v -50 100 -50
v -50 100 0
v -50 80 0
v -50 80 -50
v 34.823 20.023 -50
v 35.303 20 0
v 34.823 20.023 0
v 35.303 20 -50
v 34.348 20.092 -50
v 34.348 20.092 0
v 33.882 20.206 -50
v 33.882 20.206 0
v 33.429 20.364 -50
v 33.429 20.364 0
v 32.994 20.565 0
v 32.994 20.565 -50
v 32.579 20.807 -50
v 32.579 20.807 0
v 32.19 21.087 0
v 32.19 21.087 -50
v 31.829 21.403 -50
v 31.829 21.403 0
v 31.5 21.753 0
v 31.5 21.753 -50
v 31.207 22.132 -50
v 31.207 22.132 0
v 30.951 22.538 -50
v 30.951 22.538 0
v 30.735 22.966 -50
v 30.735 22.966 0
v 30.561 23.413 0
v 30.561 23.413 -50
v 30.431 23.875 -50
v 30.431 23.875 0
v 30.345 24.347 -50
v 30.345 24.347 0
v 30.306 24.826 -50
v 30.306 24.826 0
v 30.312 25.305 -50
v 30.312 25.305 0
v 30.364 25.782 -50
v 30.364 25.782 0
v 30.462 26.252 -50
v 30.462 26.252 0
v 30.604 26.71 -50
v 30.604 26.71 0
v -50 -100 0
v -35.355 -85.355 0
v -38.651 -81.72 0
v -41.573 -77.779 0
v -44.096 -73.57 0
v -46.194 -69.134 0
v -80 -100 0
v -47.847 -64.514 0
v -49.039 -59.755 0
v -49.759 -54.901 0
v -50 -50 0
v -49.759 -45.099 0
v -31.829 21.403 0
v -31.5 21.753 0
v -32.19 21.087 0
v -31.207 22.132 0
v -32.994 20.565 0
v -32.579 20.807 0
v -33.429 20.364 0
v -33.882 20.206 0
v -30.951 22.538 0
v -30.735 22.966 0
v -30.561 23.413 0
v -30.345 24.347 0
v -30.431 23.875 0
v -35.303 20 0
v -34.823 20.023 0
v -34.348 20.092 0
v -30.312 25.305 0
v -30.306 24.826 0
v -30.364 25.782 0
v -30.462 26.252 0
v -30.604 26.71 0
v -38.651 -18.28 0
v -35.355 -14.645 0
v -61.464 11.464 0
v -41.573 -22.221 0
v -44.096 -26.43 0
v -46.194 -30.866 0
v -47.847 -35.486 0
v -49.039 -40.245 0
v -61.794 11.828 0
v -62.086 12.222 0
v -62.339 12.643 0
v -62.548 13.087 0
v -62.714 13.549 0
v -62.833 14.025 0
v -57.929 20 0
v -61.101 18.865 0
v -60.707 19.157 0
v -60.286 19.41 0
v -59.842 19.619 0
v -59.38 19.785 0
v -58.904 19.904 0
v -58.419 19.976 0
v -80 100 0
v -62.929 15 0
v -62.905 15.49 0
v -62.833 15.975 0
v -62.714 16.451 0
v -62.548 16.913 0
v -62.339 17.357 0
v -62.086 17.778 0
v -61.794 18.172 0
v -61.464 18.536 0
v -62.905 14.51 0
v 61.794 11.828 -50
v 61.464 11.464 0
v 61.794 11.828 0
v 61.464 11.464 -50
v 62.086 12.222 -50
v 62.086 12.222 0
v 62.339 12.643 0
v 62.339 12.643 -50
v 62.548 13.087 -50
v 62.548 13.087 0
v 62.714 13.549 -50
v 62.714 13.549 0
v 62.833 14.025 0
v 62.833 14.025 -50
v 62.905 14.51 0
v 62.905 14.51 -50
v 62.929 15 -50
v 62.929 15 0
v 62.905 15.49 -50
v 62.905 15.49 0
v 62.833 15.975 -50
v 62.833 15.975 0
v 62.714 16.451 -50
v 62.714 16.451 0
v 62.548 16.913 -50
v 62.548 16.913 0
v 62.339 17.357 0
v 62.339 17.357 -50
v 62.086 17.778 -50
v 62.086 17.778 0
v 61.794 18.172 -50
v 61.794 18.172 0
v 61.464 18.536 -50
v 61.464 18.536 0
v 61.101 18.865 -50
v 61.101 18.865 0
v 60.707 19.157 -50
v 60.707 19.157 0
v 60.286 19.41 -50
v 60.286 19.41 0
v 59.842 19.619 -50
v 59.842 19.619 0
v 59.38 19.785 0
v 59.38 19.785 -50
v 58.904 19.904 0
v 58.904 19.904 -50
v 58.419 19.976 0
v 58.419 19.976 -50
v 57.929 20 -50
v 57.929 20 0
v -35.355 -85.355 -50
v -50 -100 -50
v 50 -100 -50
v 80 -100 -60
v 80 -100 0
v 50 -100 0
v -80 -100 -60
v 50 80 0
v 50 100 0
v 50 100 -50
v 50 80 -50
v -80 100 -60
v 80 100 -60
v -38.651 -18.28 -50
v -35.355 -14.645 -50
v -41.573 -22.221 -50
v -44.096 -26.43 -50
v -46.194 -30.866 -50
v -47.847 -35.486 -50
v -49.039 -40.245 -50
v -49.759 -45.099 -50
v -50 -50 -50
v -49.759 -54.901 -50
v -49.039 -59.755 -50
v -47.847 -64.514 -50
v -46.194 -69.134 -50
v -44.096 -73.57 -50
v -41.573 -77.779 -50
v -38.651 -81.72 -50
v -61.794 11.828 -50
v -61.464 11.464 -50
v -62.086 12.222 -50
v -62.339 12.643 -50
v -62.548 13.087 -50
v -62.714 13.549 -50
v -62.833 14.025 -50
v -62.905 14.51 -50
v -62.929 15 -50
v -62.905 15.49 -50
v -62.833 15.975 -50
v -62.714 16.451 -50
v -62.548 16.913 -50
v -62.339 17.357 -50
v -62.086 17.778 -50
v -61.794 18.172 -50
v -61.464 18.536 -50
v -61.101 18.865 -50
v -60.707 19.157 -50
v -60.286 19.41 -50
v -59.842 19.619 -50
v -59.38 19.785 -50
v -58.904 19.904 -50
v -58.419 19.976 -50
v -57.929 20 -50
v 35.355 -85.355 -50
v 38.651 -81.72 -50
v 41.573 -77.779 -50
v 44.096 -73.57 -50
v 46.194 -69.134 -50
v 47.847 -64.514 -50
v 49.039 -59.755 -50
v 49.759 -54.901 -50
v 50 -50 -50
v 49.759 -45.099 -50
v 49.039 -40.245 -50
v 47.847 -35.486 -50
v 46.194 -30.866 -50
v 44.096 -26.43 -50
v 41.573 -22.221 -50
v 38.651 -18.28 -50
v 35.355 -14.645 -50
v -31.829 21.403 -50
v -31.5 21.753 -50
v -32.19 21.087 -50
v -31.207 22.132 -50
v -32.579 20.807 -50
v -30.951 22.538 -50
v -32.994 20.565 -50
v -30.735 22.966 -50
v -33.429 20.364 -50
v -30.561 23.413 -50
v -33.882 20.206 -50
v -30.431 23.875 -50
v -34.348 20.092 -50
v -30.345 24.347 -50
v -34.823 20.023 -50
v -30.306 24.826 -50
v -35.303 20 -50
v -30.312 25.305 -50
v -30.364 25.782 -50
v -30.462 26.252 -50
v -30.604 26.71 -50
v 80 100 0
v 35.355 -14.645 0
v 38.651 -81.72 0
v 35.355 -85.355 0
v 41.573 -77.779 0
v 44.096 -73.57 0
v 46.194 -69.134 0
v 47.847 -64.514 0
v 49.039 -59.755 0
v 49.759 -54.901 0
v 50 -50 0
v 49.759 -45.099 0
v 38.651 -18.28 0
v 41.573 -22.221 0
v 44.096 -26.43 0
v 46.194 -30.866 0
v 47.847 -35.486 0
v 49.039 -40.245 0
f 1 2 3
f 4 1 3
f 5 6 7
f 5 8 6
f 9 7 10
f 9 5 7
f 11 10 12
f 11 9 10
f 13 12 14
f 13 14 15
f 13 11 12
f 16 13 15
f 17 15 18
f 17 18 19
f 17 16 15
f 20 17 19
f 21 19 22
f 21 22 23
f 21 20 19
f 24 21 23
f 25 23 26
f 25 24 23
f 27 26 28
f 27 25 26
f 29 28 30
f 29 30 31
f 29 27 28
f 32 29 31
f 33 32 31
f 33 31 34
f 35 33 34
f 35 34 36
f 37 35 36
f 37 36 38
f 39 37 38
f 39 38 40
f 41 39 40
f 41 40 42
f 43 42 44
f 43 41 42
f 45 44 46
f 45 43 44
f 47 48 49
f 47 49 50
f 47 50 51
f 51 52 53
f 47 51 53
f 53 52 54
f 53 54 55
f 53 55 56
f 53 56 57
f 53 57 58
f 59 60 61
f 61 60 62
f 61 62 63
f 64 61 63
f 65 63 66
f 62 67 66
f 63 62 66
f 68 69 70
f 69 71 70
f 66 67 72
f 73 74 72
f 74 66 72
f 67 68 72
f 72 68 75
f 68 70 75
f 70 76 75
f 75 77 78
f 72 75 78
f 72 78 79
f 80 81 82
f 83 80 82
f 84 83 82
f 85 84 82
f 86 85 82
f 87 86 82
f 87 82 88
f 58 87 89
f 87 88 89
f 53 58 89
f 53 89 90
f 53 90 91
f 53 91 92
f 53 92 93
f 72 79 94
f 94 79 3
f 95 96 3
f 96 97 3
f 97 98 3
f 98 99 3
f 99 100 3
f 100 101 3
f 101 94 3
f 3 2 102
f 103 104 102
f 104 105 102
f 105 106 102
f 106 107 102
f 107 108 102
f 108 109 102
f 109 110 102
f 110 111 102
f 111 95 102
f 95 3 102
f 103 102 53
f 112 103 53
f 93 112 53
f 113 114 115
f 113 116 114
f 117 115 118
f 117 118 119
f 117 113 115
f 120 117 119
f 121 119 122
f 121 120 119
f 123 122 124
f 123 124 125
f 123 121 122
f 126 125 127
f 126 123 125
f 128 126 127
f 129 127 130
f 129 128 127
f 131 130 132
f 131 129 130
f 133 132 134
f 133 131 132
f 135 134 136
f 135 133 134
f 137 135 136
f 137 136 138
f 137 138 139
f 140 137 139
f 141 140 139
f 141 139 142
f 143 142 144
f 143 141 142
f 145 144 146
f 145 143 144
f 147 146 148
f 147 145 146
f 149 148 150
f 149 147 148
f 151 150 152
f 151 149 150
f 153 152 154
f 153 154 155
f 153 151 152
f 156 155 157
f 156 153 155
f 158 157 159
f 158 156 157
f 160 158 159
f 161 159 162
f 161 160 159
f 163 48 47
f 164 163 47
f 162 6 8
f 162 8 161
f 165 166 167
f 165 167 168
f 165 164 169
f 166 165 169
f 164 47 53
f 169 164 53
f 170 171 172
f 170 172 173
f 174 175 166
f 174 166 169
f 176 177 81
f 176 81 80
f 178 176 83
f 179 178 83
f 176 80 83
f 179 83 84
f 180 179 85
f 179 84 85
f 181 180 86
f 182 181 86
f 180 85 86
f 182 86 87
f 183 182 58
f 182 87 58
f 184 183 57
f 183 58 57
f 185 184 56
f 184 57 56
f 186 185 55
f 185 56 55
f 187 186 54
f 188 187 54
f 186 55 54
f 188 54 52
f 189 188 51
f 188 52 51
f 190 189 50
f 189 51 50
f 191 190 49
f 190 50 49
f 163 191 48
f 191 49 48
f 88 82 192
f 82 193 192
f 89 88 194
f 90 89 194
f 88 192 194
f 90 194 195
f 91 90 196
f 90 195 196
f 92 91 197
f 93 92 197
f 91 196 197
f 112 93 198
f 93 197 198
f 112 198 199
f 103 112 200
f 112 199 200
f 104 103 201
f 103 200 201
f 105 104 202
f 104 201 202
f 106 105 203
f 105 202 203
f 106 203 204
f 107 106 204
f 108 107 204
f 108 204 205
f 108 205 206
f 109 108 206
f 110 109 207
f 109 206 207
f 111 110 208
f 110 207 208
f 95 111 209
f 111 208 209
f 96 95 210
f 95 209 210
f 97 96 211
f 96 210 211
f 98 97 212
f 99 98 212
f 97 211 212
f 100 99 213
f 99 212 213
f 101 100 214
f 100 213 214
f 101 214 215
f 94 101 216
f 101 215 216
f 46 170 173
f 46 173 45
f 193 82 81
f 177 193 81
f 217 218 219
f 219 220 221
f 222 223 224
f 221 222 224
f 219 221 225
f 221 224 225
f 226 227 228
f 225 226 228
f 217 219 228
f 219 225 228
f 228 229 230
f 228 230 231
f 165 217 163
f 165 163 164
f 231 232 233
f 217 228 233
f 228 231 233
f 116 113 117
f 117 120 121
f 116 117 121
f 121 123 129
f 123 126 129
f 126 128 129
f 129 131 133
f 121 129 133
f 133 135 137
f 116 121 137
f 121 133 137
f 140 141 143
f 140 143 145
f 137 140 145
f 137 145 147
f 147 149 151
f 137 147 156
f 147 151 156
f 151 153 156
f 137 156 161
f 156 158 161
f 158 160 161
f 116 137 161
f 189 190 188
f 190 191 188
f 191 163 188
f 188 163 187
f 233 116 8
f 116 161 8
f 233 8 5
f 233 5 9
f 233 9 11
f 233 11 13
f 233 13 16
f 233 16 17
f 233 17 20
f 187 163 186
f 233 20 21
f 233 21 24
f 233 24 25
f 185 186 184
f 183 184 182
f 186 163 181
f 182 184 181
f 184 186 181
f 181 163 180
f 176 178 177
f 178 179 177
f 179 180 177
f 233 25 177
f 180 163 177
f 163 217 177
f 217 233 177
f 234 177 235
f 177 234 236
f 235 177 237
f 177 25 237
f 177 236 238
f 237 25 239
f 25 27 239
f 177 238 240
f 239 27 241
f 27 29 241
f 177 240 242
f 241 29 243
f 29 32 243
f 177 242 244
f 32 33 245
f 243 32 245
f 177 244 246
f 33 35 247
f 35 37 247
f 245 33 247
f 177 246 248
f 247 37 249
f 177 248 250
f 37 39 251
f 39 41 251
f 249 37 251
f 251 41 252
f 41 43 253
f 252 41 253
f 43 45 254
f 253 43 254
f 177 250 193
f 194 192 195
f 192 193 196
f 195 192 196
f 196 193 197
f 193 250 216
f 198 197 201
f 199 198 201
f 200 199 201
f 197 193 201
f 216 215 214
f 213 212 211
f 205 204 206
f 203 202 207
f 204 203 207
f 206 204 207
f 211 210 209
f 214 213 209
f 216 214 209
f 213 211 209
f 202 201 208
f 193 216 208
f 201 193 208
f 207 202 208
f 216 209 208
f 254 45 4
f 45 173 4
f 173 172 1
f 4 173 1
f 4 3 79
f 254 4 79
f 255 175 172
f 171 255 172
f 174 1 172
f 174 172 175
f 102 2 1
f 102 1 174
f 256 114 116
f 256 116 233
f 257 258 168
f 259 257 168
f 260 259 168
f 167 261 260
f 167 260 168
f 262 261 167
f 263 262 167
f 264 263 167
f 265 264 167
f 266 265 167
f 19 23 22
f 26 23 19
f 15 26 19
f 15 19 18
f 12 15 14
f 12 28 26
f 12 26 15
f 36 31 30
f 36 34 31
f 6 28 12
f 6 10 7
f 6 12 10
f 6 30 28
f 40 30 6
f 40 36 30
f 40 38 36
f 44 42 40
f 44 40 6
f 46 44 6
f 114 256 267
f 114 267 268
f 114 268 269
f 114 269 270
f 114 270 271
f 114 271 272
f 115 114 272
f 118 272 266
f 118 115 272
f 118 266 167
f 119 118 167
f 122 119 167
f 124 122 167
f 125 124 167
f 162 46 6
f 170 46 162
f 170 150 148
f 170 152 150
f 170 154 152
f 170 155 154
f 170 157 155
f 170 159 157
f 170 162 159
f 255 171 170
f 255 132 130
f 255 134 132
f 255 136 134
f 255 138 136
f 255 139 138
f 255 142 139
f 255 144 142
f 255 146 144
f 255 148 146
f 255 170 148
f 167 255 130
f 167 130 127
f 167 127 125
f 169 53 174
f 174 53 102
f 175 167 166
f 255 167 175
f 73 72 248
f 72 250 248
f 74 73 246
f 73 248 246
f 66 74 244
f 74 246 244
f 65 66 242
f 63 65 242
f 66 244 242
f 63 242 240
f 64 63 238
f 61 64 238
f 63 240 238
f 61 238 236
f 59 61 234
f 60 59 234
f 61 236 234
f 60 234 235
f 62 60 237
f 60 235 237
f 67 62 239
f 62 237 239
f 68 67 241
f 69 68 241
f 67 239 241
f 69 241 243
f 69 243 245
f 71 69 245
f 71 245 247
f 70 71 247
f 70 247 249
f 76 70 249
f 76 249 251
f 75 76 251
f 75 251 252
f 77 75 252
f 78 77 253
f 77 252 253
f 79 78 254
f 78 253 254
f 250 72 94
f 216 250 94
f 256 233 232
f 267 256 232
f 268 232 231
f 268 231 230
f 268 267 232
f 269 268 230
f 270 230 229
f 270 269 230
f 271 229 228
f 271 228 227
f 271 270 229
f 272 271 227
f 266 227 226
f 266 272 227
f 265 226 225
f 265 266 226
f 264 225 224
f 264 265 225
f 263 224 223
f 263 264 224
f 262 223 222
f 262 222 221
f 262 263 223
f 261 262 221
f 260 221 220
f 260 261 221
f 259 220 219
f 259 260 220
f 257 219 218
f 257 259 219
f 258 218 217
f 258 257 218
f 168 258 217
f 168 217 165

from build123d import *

# Parameters (mm, degrees)
BOSS_EXTRUDE1_DEPTH   = 50
BOSS_EXTRUDE1_2_DEPTH = 50
SKETCH3_W             = 160
SKETCH3_H             = 200
BOSS_EXTRUDE2_DEPTH   = 10
FILLET1_R             = 5


with BuildPart() as part:
    # Sketch2 → Boss-Extrude1 (new body)
    with BuildSketch(Plane.XY):
        with BuildLine():
            Line((-70, 20), (-35.355339059, -14.644660941))
            ThreePointArc((-35.355339059, -14.644660941), (-50, -50), (-35.355339059, -85.355339059))
            Line((-35.355339059, -85.355339059), (-50, -100))
            Line((-50, -100), (-80, -100))
            Line((-80, -100), (-80, 100))
            Line((-80, 100), (-50, 100))
            Line((-50, 100), (-50, 80))
            Line((-50, 80), (-28.161785944, 20))
            Line((-28.161785944, 20), (-70, 20))
        make_face()
    extrude(amount=-BOSS_EXTRUDE1_DEPTH)



with BuildPart() as body_2:
    # Sketch2 → Boss-Extrude1 2 (new body)
    with BuildSketch(Plane.XY):
        with BuildLine():
            Line((70, 20), (35.355339059, -14.644660941))
            ThreePointArc((35.355339059, -14.644660941), (50, -50), (35.355339059, -85.355339059))
            Line((35.355339059, -85.355339059), (50, -100))
            Line((50, -100), (80, -100))
            Line((80, -100), (80, 100))
            Line((80, 100), (50, 100))
            Line((50, 100), (50, 80))
            Line((50, 80), (28.161785944, 20))
            Line((28.161785944, 20), (70, 20))
        make_face()
    extrude(amount=-BOSS_EXTRUDE1_2_DEPTH)


with BuildPart() as part_1:
    add(part.part)

    add(body_2.part)  # Boss-Extrude2 merges body 2
    # Sketch3 → Boss-Extrude2 (add)
    with BuildSketch(Plane(origin=(0, 0, -50), x_dir=(-1, 0, 0), z_dir=(0, 0, -1))):
        Rectangle(SKETCH3_W, SKETCH3_H)
    extrude(amount=BOSS_EXTRUDE2_DEPTH)

    # Fillet1
    fillet1_edges = [part_1.edges().sort_by_distance(p)[0] for p in [
        (-28.161785944, 20, -25),
        (-70, 20, -25),
        (70, 20, -25),
        (28.161785944, 20, -25),
    ]]
    fillet(fillet1_edges, radius=FILLET1_R)


solid = part_1.part
